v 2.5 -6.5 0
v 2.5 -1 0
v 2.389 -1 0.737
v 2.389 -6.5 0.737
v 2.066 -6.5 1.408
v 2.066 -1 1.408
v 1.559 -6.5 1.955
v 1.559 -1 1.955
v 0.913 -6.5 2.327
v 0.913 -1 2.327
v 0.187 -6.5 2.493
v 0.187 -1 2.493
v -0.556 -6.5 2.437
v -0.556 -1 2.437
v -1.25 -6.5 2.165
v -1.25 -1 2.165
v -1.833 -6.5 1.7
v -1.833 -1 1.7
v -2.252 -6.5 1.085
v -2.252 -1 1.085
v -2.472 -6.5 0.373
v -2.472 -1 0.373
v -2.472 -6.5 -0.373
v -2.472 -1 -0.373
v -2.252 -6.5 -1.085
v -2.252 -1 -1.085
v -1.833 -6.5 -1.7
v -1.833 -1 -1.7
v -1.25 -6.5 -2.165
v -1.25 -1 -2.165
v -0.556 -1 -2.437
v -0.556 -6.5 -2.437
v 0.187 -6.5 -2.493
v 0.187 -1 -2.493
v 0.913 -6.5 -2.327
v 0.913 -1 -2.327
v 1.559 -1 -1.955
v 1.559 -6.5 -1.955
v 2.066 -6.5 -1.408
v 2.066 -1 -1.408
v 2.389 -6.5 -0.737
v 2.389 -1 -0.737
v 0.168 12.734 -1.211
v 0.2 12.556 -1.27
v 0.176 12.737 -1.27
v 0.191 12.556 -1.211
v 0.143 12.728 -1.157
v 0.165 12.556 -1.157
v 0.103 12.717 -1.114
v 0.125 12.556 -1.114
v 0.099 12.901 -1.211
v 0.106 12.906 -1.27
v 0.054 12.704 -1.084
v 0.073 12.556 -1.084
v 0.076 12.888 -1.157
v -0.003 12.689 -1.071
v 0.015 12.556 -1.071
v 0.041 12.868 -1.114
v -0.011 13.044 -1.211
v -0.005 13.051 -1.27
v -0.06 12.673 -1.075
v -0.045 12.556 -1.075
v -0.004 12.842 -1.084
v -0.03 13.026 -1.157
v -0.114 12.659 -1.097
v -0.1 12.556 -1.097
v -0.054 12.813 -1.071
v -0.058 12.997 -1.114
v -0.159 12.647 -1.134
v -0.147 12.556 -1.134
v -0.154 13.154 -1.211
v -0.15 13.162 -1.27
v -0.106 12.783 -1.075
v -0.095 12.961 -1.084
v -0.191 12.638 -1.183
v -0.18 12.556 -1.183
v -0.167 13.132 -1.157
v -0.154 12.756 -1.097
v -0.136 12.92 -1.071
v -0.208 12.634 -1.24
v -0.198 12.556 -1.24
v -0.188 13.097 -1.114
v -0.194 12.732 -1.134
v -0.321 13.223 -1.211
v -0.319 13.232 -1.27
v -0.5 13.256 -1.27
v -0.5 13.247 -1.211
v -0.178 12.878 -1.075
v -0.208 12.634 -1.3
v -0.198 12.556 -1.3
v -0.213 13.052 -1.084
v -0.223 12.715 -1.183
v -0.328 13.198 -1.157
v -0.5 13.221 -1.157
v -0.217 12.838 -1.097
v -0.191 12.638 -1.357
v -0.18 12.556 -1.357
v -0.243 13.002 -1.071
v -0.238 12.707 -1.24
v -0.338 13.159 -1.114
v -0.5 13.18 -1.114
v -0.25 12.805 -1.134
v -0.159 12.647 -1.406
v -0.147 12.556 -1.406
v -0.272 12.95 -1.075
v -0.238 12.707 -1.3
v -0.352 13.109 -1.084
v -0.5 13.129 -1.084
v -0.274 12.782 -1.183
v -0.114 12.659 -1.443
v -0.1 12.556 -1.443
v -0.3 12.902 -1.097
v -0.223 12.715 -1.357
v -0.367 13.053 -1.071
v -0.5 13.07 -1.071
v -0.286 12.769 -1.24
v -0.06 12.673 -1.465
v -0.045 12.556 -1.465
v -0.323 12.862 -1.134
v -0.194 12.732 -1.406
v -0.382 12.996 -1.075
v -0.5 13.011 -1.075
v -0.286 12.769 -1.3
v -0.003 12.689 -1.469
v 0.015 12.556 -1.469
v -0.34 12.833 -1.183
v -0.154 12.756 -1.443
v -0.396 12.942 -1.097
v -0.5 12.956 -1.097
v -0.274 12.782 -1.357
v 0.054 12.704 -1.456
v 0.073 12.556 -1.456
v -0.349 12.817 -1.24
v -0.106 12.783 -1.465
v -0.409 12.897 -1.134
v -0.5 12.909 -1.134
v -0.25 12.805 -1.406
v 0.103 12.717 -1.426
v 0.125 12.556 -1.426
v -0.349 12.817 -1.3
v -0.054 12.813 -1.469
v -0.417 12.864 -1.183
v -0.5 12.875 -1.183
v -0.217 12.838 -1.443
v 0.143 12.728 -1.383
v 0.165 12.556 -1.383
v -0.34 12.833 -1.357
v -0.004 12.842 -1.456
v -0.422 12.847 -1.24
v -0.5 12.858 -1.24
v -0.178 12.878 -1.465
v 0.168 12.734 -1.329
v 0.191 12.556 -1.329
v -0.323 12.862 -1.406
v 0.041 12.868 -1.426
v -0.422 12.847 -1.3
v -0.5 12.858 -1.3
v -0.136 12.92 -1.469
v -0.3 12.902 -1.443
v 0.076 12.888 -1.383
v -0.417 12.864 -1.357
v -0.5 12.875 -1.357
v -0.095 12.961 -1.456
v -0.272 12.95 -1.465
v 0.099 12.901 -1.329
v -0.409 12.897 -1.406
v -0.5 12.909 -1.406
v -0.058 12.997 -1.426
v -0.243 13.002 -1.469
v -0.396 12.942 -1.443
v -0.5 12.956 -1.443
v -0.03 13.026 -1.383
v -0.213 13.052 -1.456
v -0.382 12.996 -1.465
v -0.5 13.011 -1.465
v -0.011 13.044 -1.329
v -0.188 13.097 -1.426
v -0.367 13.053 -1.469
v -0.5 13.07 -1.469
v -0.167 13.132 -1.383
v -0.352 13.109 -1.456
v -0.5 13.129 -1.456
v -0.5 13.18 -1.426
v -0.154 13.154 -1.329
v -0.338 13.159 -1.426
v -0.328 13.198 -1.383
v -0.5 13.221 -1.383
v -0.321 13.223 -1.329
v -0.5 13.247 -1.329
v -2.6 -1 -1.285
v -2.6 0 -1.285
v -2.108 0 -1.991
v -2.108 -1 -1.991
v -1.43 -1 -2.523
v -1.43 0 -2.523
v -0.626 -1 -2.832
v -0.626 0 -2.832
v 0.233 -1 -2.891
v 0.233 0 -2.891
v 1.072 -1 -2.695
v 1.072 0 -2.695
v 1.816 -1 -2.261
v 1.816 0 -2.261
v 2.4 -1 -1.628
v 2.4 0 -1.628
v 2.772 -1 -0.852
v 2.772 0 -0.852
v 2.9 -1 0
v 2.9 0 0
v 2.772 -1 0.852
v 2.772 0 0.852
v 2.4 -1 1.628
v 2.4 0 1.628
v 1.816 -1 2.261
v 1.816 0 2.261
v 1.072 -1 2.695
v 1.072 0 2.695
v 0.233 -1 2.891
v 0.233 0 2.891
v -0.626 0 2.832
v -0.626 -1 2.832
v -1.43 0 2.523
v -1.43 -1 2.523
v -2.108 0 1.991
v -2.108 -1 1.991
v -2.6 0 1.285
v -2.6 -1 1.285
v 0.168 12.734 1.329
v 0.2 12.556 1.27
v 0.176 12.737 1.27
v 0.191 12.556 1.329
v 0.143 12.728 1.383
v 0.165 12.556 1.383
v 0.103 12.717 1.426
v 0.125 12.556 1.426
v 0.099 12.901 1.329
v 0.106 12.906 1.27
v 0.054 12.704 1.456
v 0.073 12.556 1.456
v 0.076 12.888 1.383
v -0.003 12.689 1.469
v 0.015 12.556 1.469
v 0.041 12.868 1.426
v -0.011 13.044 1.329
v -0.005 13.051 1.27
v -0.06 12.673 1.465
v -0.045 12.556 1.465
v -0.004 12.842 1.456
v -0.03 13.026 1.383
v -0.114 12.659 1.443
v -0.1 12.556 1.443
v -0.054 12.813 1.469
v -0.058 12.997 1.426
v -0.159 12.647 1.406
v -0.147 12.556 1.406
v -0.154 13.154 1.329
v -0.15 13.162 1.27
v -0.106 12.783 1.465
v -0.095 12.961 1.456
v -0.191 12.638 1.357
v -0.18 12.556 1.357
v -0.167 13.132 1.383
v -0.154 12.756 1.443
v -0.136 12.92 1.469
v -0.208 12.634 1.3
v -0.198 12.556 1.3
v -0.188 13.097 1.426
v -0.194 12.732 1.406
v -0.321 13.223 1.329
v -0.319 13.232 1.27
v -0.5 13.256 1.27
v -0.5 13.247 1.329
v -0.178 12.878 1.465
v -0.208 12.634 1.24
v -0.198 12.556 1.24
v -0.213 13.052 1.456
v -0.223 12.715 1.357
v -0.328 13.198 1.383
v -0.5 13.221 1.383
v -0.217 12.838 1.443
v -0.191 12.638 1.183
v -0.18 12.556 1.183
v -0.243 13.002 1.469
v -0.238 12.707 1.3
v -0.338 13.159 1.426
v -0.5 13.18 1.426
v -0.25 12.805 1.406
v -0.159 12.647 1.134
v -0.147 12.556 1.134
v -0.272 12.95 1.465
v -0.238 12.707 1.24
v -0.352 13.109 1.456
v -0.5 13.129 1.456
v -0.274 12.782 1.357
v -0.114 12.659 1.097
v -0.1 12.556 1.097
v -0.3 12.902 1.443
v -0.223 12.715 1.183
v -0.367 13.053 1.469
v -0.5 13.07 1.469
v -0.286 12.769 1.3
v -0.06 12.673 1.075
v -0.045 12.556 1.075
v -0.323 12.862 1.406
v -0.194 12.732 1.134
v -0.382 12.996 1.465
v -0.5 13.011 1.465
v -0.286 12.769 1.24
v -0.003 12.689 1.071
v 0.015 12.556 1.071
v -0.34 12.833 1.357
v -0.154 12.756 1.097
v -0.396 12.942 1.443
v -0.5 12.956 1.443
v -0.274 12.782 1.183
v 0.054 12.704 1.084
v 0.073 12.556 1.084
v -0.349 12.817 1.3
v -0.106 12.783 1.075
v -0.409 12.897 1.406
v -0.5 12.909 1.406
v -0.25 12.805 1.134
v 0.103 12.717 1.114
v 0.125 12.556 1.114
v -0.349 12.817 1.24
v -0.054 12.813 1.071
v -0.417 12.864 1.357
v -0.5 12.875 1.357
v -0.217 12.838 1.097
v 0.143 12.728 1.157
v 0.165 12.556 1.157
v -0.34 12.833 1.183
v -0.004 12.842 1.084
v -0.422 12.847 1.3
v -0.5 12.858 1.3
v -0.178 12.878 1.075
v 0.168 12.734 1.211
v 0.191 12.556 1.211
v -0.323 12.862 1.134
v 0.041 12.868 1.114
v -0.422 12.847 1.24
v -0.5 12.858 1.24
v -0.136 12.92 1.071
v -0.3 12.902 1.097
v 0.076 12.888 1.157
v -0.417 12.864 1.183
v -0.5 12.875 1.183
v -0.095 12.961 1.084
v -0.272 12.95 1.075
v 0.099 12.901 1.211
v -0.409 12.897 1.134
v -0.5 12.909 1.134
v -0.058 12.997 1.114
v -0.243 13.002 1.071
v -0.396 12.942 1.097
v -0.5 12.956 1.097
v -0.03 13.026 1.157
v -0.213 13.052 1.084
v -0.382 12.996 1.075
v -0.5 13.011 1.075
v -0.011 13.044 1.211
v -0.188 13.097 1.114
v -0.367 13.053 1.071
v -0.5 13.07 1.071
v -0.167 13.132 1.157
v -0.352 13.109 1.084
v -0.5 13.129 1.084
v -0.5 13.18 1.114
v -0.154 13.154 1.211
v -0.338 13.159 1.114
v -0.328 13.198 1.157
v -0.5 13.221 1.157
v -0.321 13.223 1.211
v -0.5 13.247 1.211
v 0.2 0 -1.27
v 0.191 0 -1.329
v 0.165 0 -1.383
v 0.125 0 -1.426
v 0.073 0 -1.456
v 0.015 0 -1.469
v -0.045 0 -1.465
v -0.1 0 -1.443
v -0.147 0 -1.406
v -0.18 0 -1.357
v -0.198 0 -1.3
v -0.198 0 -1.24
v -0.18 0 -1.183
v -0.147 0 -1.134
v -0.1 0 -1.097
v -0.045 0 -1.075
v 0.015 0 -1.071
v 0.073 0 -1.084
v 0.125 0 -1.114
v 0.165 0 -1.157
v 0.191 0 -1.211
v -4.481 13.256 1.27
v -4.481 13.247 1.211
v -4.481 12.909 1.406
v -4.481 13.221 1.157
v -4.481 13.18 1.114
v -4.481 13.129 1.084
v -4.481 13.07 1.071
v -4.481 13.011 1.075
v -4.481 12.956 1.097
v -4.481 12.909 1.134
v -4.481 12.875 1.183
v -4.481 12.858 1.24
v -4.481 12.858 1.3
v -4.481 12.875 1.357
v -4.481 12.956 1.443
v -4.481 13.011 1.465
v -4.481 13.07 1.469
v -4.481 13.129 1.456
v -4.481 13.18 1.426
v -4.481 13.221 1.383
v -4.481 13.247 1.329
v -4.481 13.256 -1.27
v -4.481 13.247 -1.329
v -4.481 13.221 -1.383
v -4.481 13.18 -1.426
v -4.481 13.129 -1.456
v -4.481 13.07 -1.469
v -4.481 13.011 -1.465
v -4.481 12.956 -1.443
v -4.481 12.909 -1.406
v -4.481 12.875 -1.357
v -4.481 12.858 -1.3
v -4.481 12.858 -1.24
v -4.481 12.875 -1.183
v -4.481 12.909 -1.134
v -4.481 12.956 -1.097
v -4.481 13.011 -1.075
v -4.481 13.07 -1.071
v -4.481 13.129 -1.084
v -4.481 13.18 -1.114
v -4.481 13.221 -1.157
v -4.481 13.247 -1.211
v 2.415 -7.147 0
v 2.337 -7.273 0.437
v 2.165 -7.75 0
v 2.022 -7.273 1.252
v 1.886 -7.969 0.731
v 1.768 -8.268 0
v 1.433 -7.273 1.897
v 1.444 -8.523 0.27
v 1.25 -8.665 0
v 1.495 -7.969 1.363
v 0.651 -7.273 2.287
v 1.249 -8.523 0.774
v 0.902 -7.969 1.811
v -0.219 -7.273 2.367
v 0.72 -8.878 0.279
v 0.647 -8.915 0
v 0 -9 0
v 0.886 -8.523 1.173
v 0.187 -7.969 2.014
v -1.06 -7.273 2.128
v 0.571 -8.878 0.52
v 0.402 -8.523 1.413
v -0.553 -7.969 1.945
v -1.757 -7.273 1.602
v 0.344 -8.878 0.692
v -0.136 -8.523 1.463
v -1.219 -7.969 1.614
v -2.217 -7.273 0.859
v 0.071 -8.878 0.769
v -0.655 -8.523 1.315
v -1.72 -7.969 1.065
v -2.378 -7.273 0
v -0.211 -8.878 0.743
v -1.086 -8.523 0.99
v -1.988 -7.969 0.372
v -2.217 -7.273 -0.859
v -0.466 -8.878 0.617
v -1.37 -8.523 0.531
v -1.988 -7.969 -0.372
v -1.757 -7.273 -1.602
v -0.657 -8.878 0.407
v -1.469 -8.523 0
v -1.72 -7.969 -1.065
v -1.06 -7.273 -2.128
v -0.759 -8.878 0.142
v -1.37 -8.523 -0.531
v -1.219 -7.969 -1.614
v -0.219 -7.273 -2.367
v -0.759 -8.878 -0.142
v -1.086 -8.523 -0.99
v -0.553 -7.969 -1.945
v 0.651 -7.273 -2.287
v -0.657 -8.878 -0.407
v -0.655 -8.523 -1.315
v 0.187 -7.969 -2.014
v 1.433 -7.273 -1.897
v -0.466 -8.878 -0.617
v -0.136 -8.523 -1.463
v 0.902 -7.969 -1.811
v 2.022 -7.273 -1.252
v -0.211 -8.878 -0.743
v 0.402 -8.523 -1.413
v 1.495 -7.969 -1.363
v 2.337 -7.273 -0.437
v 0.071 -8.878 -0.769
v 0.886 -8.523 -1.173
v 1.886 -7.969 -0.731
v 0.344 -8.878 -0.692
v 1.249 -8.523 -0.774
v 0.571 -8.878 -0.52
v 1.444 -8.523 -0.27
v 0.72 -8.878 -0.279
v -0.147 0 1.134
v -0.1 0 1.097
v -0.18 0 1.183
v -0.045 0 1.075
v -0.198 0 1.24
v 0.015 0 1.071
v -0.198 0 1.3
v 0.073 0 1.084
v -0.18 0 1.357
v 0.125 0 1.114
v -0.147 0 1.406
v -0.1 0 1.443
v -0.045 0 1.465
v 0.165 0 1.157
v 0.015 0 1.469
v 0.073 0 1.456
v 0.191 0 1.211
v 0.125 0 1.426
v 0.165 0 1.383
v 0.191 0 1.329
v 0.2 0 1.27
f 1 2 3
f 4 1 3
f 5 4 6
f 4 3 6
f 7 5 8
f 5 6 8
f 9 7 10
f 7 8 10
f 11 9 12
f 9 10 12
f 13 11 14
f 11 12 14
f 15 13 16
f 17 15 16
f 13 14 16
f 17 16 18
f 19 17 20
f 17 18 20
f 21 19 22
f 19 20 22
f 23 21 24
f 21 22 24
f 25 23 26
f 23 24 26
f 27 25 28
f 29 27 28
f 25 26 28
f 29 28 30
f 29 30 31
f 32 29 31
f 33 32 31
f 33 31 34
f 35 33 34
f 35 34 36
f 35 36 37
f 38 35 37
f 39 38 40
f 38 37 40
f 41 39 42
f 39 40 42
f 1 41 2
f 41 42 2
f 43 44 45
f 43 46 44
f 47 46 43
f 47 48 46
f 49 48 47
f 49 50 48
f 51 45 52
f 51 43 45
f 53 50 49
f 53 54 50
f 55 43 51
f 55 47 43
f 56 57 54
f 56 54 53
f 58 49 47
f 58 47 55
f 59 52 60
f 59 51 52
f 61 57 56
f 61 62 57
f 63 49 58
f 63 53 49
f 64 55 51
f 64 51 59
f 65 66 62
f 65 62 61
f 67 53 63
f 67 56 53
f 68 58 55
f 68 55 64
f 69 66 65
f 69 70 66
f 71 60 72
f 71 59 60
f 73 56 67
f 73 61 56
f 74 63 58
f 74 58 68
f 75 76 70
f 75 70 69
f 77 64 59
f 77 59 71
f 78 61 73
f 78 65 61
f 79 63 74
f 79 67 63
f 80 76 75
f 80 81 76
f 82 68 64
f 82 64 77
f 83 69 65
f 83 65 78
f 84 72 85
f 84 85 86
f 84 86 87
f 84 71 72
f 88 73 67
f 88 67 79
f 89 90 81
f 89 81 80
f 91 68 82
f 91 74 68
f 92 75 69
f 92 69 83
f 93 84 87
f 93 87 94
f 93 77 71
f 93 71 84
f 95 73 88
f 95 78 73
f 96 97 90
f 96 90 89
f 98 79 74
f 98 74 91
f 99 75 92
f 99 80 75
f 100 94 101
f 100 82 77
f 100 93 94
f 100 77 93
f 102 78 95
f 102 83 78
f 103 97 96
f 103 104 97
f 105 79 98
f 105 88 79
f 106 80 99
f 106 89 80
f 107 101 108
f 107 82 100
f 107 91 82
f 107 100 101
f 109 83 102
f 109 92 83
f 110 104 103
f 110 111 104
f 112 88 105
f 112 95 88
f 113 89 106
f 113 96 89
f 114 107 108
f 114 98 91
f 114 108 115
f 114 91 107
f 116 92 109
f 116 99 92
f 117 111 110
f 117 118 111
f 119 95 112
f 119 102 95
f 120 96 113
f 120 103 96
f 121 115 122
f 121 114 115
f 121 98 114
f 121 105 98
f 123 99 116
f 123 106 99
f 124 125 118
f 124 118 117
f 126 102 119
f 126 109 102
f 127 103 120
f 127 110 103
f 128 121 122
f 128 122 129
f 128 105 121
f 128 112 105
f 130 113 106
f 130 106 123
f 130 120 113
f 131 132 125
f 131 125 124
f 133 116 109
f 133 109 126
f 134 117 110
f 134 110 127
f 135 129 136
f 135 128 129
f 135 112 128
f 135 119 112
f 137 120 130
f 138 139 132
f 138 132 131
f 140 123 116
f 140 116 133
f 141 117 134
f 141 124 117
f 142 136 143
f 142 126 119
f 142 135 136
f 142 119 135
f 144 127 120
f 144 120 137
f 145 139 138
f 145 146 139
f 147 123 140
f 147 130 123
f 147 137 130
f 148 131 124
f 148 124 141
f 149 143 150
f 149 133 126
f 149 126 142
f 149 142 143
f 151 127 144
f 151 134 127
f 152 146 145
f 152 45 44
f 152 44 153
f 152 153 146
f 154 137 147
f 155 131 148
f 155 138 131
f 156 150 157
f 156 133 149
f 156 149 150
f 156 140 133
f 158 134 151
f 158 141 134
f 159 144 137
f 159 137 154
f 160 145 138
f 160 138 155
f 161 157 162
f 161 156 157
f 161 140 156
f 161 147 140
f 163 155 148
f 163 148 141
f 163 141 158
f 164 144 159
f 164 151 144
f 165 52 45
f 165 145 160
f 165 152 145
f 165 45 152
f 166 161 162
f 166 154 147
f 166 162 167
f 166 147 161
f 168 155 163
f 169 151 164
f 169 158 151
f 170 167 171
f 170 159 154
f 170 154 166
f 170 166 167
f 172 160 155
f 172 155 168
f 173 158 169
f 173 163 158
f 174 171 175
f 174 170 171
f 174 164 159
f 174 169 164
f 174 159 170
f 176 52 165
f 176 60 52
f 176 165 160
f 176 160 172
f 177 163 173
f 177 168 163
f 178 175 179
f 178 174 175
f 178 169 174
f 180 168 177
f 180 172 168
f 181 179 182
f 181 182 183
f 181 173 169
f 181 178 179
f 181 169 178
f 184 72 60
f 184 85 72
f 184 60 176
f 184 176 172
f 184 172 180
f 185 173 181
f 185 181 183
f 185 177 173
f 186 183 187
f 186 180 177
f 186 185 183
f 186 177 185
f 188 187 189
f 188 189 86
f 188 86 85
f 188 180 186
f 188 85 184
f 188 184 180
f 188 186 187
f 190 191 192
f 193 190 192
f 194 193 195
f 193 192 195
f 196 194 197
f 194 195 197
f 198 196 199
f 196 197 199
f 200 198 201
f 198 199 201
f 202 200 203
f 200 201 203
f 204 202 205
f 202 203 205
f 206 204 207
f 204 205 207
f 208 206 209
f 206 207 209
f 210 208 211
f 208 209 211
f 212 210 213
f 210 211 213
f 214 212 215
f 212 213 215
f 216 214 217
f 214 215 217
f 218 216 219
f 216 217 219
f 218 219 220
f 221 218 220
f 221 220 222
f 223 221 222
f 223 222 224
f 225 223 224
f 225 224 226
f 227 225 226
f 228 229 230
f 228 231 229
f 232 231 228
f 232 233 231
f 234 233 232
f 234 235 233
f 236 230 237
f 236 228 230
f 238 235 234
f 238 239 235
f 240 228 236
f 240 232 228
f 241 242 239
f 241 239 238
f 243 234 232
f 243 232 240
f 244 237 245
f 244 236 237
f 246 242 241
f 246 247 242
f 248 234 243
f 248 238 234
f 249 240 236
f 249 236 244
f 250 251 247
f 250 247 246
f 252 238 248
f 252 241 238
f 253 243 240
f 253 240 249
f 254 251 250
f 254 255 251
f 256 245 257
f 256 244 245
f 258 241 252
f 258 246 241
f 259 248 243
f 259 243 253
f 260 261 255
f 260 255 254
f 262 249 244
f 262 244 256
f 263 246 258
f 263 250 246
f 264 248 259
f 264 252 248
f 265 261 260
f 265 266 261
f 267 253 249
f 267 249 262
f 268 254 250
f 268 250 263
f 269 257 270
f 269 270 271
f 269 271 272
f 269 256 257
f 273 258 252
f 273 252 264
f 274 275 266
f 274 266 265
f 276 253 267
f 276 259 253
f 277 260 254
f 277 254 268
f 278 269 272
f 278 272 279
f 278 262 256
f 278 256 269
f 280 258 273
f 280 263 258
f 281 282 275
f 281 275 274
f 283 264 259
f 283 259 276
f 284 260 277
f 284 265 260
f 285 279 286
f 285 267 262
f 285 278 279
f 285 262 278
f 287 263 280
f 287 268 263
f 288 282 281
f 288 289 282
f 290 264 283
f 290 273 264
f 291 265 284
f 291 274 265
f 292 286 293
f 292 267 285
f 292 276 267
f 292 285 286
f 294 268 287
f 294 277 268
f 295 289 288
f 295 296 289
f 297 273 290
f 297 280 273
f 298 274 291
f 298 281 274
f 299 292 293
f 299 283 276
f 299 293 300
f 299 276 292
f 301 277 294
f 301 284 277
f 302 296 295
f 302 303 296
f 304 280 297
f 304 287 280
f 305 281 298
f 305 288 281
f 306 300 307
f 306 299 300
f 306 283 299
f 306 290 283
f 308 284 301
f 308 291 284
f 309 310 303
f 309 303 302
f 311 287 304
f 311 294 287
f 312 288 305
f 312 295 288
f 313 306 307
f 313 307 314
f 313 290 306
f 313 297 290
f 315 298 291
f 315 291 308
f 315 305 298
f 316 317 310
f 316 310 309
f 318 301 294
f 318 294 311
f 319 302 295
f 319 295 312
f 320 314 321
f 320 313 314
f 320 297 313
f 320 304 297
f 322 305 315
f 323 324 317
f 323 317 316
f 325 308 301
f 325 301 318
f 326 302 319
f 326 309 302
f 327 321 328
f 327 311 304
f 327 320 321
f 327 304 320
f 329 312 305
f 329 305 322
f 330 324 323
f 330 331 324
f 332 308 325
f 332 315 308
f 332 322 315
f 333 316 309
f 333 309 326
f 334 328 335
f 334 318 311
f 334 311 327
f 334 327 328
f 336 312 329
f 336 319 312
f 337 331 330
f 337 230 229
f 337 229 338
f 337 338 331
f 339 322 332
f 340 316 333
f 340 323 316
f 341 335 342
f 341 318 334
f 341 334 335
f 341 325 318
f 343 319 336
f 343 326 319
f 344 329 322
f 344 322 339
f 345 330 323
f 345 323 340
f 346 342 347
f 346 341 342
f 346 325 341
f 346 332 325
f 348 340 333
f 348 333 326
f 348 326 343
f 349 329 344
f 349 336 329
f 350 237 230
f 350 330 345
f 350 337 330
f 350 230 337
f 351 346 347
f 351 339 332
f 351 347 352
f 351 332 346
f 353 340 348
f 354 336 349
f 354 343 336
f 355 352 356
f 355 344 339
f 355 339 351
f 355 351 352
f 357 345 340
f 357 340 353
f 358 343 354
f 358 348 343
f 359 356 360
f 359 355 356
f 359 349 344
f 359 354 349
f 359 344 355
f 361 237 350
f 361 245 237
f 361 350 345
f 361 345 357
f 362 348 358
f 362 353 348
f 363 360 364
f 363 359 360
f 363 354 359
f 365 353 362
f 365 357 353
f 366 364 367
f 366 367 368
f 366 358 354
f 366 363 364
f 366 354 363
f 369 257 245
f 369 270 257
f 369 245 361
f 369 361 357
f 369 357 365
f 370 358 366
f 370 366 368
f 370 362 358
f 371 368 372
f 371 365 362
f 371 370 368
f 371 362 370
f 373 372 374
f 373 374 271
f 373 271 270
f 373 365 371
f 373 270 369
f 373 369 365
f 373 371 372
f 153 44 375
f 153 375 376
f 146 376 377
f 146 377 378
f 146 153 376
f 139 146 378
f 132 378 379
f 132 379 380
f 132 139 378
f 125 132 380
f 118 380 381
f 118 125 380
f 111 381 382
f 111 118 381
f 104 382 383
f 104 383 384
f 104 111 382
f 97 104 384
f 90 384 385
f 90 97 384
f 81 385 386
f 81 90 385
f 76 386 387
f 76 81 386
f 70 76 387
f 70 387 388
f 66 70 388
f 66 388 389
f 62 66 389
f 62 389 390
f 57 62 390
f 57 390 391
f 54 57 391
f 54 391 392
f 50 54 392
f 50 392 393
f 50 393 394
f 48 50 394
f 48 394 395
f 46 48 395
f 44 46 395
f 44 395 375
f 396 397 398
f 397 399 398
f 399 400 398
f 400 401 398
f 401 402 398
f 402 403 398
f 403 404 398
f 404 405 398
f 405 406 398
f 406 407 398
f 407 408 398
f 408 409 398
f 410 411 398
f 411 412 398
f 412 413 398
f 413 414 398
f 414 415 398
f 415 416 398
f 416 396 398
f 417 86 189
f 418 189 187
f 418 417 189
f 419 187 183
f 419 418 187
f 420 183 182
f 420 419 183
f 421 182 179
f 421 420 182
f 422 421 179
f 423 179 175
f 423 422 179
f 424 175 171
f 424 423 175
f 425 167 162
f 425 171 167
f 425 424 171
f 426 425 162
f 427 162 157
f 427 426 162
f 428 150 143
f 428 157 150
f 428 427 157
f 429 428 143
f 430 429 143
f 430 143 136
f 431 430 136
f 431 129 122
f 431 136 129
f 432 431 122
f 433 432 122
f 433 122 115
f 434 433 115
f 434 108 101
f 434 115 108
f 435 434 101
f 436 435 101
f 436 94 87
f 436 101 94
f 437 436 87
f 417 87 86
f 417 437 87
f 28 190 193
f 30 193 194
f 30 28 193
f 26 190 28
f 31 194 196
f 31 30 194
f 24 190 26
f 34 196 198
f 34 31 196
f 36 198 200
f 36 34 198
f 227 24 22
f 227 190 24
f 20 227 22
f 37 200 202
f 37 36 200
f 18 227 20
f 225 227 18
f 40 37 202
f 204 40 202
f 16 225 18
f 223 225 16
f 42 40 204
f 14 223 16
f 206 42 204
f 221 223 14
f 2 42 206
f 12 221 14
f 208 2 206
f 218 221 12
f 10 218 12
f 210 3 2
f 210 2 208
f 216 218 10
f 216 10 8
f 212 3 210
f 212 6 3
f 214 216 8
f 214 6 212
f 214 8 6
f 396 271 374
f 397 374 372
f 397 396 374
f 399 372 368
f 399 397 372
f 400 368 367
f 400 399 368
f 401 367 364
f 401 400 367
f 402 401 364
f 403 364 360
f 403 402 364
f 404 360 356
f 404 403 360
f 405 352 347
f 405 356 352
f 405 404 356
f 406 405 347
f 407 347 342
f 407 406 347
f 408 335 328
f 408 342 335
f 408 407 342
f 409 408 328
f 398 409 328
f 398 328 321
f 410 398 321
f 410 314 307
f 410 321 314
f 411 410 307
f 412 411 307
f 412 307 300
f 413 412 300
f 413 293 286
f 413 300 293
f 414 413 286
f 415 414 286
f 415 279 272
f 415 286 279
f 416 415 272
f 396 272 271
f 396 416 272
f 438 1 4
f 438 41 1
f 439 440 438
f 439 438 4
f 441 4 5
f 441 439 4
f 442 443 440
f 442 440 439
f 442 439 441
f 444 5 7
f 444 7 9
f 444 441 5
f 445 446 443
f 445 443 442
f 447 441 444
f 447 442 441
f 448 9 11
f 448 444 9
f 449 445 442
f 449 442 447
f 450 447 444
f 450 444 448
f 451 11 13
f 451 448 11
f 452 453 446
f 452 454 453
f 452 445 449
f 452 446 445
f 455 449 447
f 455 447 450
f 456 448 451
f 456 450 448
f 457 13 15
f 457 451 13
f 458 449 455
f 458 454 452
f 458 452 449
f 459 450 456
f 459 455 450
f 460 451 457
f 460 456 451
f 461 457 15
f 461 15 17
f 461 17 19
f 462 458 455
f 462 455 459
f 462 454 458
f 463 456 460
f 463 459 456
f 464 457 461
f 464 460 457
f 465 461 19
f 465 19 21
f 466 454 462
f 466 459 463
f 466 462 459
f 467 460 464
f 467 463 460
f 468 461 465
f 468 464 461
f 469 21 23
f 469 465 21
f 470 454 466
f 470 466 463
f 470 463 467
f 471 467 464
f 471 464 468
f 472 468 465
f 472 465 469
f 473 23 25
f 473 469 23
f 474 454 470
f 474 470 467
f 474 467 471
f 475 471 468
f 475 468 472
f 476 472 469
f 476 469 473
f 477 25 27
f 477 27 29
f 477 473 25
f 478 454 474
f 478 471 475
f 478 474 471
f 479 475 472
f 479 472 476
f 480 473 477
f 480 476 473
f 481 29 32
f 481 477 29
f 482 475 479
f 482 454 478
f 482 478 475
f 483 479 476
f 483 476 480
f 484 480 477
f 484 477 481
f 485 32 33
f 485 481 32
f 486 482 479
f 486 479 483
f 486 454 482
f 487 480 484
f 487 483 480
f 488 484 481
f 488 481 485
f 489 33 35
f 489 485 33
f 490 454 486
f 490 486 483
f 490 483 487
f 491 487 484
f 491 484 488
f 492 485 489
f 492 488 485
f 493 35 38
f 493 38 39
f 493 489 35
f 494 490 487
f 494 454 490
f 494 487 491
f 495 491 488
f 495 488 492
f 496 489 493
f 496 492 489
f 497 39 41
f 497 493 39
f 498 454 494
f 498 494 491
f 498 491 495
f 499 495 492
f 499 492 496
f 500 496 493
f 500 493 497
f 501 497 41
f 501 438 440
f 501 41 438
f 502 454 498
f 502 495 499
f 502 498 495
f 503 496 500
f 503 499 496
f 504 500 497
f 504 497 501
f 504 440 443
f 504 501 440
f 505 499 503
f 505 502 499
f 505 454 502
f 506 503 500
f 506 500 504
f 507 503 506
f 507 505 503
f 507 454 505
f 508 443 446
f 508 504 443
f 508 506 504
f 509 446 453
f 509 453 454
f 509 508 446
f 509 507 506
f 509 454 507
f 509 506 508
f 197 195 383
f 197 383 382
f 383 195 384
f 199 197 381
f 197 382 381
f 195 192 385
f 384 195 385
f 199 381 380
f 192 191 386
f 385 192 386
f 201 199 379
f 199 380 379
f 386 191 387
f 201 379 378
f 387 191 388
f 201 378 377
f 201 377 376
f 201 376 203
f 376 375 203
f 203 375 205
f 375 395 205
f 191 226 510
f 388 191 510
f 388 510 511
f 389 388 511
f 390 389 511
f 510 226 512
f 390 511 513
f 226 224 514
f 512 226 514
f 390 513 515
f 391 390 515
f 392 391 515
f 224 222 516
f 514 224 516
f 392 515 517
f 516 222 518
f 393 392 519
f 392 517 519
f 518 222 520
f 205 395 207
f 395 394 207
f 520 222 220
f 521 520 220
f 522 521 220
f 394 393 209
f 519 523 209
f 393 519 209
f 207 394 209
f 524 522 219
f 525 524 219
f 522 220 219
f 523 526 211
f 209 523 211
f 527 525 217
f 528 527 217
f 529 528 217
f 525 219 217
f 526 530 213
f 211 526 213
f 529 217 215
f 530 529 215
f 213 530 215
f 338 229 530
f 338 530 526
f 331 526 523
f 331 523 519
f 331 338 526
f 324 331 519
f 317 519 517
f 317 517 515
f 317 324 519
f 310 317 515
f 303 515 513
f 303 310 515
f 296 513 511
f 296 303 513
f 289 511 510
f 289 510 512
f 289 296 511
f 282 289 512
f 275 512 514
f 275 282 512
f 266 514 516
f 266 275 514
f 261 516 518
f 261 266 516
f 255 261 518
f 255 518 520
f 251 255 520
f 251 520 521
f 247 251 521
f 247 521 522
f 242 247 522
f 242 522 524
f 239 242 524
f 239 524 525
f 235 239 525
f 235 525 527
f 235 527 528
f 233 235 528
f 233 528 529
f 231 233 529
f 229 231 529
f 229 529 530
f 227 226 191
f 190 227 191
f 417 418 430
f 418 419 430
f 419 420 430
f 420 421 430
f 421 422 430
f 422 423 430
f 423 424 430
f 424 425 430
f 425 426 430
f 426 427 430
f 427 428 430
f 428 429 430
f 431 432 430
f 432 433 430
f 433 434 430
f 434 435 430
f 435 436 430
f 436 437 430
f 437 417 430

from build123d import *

# Parameters (mm, degrees)
F1_DEPTH = 1
F3_R     = 0.2
F5_R     = 2.5
F6_DEPTH = 8
F7_R     = 2.5


with BuildPart() as f1:
    # F0 (on Front) → F1 (new body)
    with BuildSketch(Plane.XZ):
        with BuildLine():
            ThreePointArc((-2.6, -1.2845232579), (2.9, 0), (-2.6, 1.2845232579))
            Line((-2.6, 1.2845232579), (-2.6, -1.2845232579))
        make_face()
    extrude(amount=F1_DEPTH)

    # F4: sweep along a path in F2
    with BuildLine(Plane.XY) as f4_path:
        Line((0, 0), (0, 12.5555443466))
        ThreePointArc((0, 12.5555443466), (-0.1464466094, 12.9090977372), (-0.5, 13.0555443466))
        Line((-0.5, 13.0555443466), (-4.480665084, 13.0555443466))
    # F3 (on Front) → F4 (sweep)
    with BuildSketch(Plane.XZ):
        with Locations((0, 1.27)):
            Circle(F3_R)
        with Locations((0, -1.27)):
            Circle(F3_R)
    sweep(path=f4_path.line)

    # F5 (on face) → F6 (join)
    with BuildSketch(Plane.XZ.offset(1)):
        Circle(F5_R)
    extrude(amount=F6_DEPTH)

    # F7
    f7_edges = [f1.edges().sort_by_distance(p)[0] for p in [
        (-2.5, -9, 0),
    ]]
    fillet(f7_edges, radius=F7_R)


solid = f1.part
